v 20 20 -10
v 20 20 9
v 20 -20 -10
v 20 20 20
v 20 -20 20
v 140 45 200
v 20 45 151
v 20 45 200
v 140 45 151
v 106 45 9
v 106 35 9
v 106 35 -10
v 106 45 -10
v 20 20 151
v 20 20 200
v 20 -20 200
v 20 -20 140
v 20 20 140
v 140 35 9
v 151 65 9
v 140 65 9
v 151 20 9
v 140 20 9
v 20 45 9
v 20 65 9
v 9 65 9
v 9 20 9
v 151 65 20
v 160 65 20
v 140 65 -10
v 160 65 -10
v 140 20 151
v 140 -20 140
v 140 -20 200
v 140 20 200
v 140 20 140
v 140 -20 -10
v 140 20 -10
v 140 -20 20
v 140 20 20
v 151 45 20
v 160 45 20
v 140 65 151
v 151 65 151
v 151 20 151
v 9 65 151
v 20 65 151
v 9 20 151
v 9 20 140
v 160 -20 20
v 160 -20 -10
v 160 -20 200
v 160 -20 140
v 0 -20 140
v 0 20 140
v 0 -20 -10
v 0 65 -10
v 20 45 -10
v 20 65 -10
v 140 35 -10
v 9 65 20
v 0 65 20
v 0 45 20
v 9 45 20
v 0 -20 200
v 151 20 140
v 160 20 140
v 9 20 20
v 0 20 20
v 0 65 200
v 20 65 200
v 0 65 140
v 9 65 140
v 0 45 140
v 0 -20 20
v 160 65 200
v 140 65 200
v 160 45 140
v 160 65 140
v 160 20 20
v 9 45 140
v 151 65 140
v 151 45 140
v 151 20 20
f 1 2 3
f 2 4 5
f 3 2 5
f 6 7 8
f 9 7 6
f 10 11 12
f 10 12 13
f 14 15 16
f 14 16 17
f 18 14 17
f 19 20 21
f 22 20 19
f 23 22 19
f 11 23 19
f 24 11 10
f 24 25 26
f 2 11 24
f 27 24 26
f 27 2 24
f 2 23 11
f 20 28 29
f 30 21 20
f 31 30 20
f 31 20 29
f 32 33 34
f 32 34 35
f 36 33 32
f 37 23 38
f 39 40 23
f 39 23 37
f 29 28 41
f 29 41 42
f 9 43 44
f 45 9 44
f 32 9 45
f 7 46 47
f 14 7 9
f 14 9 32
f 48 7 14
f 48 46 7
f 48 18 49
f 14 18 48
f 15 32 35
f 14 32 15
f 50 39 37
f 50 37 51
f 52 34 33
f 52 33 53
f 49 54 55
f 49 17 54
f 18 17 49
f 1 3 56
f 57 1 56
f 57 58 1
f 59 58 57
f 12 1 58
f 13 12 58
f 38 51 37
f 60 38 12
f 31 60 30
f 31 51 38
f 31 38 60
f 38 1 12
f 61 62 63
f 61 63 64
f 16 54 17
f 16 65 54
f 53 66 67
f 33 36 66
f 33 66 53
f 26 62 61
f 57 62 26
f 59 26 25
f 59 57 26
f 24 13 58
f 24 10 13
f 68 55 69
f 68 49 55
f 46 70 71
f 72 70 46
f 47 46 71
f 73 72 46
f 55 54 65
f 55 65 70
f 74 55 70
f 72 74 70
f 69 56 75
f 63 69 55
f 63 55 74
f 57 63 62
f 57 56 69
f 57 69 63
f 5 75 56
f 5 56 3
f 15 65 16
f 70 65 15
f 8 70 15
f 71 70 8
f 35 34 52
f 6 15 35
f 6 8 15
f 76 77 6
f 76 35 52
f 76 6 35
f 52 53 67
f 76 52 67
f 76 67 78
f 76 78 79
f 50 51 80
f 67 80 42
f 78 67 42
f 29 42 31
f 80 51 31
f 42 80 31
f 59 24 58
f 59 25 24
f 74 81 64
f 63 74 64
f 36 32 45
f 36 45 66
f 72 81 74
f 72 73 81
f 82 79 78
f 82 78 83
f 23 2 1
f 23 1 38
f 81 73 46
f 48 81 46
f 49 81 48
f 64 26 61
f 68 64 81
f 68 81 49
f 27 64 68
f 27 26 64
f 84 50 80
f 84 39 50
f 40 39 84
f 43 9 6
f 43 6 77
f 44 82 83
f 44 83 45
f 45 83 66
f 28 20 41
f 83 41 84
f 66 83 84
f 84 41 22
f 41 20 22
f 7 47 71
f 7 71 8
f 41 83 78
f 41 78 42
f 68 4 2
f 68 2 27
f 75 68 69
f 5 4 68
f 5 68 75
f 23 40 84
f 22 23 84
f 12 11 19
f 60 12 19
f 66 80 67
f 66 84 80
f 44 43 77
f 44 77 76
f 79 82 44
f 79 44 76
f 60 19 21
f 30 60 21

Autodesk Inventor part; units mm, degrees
ref_plane "YZ Plane" through (0, 0, 0) normal (1, 0, 0) x (0, 1, 0)
ref_plane "XZ Plane" through (0, 0, 0) normal (0, 1, 0) x (-1, 0, 0)
ref_plane "XY Plane" through (0, 0, 0) normal (0, 0, 1) x (1, 0, 0)
sketch "Sketch1" plane through (0, 0, 0) normal (0, 1, 0) x (-1, 0, 0)
  line L0 (0, 0) -> (-160, 0)
  line L1 (-160, 0) -> (-160, 190)
  line L2 (-160, 190) -> (0, 190)
  line L3 (0, 190) -> (0, 0)
  dimension "d0" = 160
  dimension "d1" = 190
extrude "Extrusion1" add sketch "Sketch1" along normal blind 55
sketch "Sketch2" plane through (0, 55, 0) normal (0, 1, 0) x (1, 0, 0)
  line L0 (0, 0) -> (10, 0)
  line L1 (10, 0) -> (10, -10)
  line L2 (10, -10) -> (0, -10)
  line L3 (0, -10) -> (0, 0)
  line L4 (10, -10) -> (150, -10)
  line L5 (150, -10) -> (150, -150)
  line L6 (150, -150) -> (10, -150)
  line L7 (10, -150) -> (10, -10)
  dimension "d4" = 10
  dimension "d5" = 10
  dimension "d6" = 140
  dimension "d7" = 140
extrude "Extrusion2" cut sketch "Sketch2" against normal blind 35 contours L4 L5 L6 L7
sketch "Sketch3" plane through (0, 20, 0) normal (0, 1, 0) x (1, 0, 0)
  line L0 (10, -150) -> (10, -10) projected
  line L1 (10, -10) -> (20, -10)
  line L2 (20, -10) -> (20, -20)
  line L3 (20, -20) -> (10, -20)
  line L4 (10, -20) -> (10, -10)
  line L5 (20, -20) -> (140, -20)
  line L6 (140, -20) -> (140, -140)
  line L7 (140, -140) -> (20, -140)
  line L8 (20, -140) -> (20, -20)
  point P0 (0, 0)
  dimension "d10" = 10
  dimension "d11" = 10
  dimension "d12" = 120
  dimension "d13" = 120
extrude "Extrusion3" cut sketch "Sketch3" against normal blind 20 contours L5 L6 L7 L8
sketch "Sketch4" plane through (0, 20, 0) normal (0, 1, 0) x (1, 0, 0)
  line L0 (20, -20) -> (20, -140) projected
  line L1 (20, -20) -> (10, -20)
  line L2 (10, -20) -> (10, -140)
  line L3 (10, -140) -> (20, -140)
  line L4 (20, -140) -> (20, -20)
  line L5 (140, -20) -> (20, -20) projected
  line L6 (140, -20) -> (150, -20)
  line L7 (150, -20) -> (150, -140)
  line L8 (150, -140) -> (140, -140)
  line L9 (140, -140) -> (140, -20)
  line L10 (20, -20) -> (140, -20)
  line L11 (140, -20) -> (140, -10)
  line L12 (140, -10) -> (20, -10)
  line L13 (20, -10) -> (20, -20)
  line L14 (20, -140) -> (140, -140)
  line L15 (140, -140) -> (140, -150)
  line L16 (140, -150) -> (20, -150)
  line L17 (20, -150) -> (20, -140)
  point P0 (0, 0)
  dimension "d16" = 10
  dimension "d17" = 10
  dimension "d18" = 120
  dimension "d19" = 120
  dimension "d20" = 10
  dimension "d21" = 120
  dimension "d22" = 10
extrude "Extrusion4" cut sketch "Sketch4" against normal blind 20 contours L0 L3 L2 L1 | L13 L12 L11 L5 | L14 L15 L16 L17 | L6 L7 L8 L9
sketch "Sketch5" plane through (10, 55, 150) normal (1, 0, 0) x (0, 0, -1)
  line L0 (0, -35) -> (10, -35) projected
  line L1 (10, -35) -> (130, -35)
  line L2 (130, -35) -> (130, -55)
  line L3 (130, -55) -> (10, -55)
  line L4 (10, -55) -> (10, -35)
  point P0 (150, -55)
extrude "Extrusion5" cut sketch "Sketch5" against normal blind 10
sketch "Sketch6" plane through (150, 55, 10) normal (-1, 0, 0) x (0, 0, 1)
  line L0 (130, -35) -> (130, -55) projected
  line L1 (10, -35) -> (130, -35)
  line L2 (130, -35) -> (130, -55)
  line L3 (130, -55) -> (10, -55)
  line L4 (10, -55) -> (10, -35)
  point P0 (-10, -55)
  dimension "d27" = 120
  dimension "d28" = 20
extrude "Extrusion6" cut sketch "Sketch6" against normal blind 10
sketch "Sketch7" plane through (0, 0, 0) normal (0, -1, 0) x (1, 0, 0)
  line L0 (160, 190) -> (0, 190) projected
  line L1 (160, 190) -> (150, 190)
  line L2 (150, 190) -> (150, 180)
  line L3 (150, 180) -> (160, 180)
  line L4 (160, 180) -> (160, 190)
  line L5 (0, 140) -> (20, 140) projected
  line L6 (150, 150) -> (10, 150) projected
  line L7 (0, 140) -> (20, 140)
  line L8 (20, 140) -> (20, 150)
  line L9 (20, 150) -> (0, 150)
  line L10 (0, 150) -> (0, 140)
  line L11 (10, 150) -> (10, 10) projected
  line L12 (10, 150) -> (20, 150)
  line L13 (20, 150) -> (20, 160)
  line L14 (20, 160) -> (10, 160)
  line L15 (10, 160) -> (10, 150)
  line L16 (10, 160) -> (150, 160)
  line L17 (150, 160) -> (150, 180)
  line L18 (150, 180) -> (10, 180)
  line L19 (10, 180) -> (10, 160)
  point P0 (0, 0)
  dimension "d31" = 10
  dimension "d32" = 10
  dimension "d33" = 20
  dimension "d34" = 10
  dimension "d35" = 10
extrude "Extrusion7" cut sketch "Sketch7" against normal blind 45 contours L17 L16 L14 L19 L18
sketch "Sketch8" plane through (10, 55, 10) normal (0, 0, 1) x (1, 0, 0)
  line L0 (10, -35) -> (10, -55) projected
  line L1 (130, -55) -> (10, -55)
  line L2 (10, -55) -> (10, -35)
  line L3 (10, -35) -> (130, -35)
  line L4 (130, -35) -> (130, -55)
  point P0 (-10, -55)
  dimension "d38" = 120
  dimension "d39" = 20
extrude "Extrusion8" cut sketch "Sketch8" against normal blind 10
sketch "Sketch9" plane through (150, 55, 10) normal (-1, 0, 0) x (0, 0, 1)
  line L0 (140, 0) -> (140, -35) projected
  line L1 (0, 0) -> (0, -35) projected
  line L2 (140, -35) -> (0, -35)
  line L3 (0, -35) -> (0, 0)
  line L4 (0, 0) -> (140, 0)
  line L5 (140, 0) -> (140, -35)
  point P0 (-10, -55)
extrude "Extrusion9" cut sketch "Sketch9" against normal blind 1
sketch "Sketch10" plane through (10, 55, 150) normal (1, 0, 0) x (0, 0, -1)
  line L0 (0, 0) -> (0, -35) projected
  line L1 (0, 0) -> (140, 0)
  line L2 (140, 0) -> (140, -35)
  line L3 (140, -35) -> (0, -35)
  line L4 (0, -35) -> (0, 0)
  point P0 (150, -55)
extrude "Extrusion10" cut sketch "Sketch10" against normal blind 1
sketch "Sketch11" plane through (20, 20, 10) normal (0, 0, 1) x (1, 0, 0)
  line L0 (120, 0) -> (131, 0) projected
  line L1 (131, 0) -> (-11, 0)
  line L2 (-11, 0) -> (-11, 35)
  line L3 (-11, 35) -> (131, 35)
  line L4 (131, 35) -> (131, 0)
  point P0 (-20, -20)
extrude "Extrusion11" cut sketch "Sketch11" against normal blind 1
sketch "Sketch12" plane through (140, 0, 150) normal (0, 0, -1) x (-1, 0, 0)
  line L0 (-11, 55) -> (-11, 20) projected
  line L1 (-11, 55) -> (131, 55)
  line L2 (131, 55) -> (131, 20)
  line L3 (131, 20) -> (-11, 20)
  line L4 (-11, 20) -> (-11, 55)
  line L5 (0, 0) -> (-20, 0) projected
  line L6 (0, 0) -> (120, 0)
  line L7 (120, 0) -> (120, 20)
  line L8 (120, 20) -> (0, 20)
  line L9 (0, 20) -> (0, 0)
  point P0 (140, 0)
extrude "Extrusion12" cut sketch "Sketch12" against normal blind 1
sketch "Sketch14" plane through (160, 55, 0) normal (0, 0, -1) x (-1, 0, 0)
  line L0 (0, -55) -> (0, 0) projected
  line L1 (20, -35) -> (20, -55) projected
  line L2 (0, -55) -> (20, -55)
  line L3 (20, -55) -> (20, -35)
  line L4 (20, -35) -> (0, -35)
  line L5 (0, -35) -> (0, -55)
  line L6 (160, -55) -> (160, -35) projected
  line L7 (140, -35) -> (140, -55) projected
  line L8 (160, -55) -> (140, -55)
  line L9 (140, -55) -> (140, -35)
  line L10 (140, -35) -> (160, -35)
  line L11 (160, -35) -> (160, -55)
  line L12 (151, -35) -> (160, -35) projected
  line L13 (160, 0) -> (0, 0) projected
  line L14 (160, -35) -> (0, -35)
  line L15 (0, -35) -> (0, 0)
  line L16 (0, 0) -> (160, 0)
  line L17 (160, 0) -> (160, -35)
extrude "Extrusion13" add sketch "Sketch14" along normal blind 10
sketch "Sketch15" plane through (0, 0, 190) normal (0, 0, 1) x (1, 0, 0)
  line L0 (0, 0) -> (0, 55) projected
  line L1 (160, 0) -> (140, 0) projected
  line L2 (0, 55) -> (160, 55)
  line L3 (160, 55) -> (160, 0)
  line L4 (160, 0) -> (0, 0)
  line L5 (0, 0) -> (0, 55)
extrude "Extrusion14" add sketch "Sketch15" along normal blind 10
sketch "Sketch16" plane through (0, 45, 0) normal (0, -1, 0) x (1, 0, 0)
  line L0 (10, 160) -> (10, 180) projected
  line L1 (10, 180) -> (150, 180) projected
  line L2 (10, 160) -> (150, 160)
  line L3 (150, 160) -> (150, 180)
  line L4 (150, 180) -> (10, 180)
  line L5 (10, 180) -> (10, 160)
  point P0 (0, 0)
extrude "Extrusion15" add sketch "Sketch16" along normal blind 45
sketch "Sketch17" plane through (20, 20, 9) normal (0, 0, 1) x (1, 0, 0)
  line L0 (-11, 0) -> (-11, 35) projected
  line L1 (-11, 35) -> (131, 35)
  line L2 (131, 35) -> (131, 25)
  line L3 (131, 25) -> (-11, 25)
  line L4 (-11, 25) -> (-11, 35)
  point P0 (-20, -20)
  dimension "d56" = 142
  dimension "d57" = 10
extrude "Extrusion16" cut sketch "Sketch17" against normal blind 19
sketch "Sketch19" plane through (9, 55, 150) normal (1, 0, 0) x (0, 0, -1)
  line L0 (160, 0) -> (160, -10) projected
  line L1 (141, -10) -> (160, -10) projected
  line L2 (160, 0) -> (141, 0)
  line L3 (141, 0) -> (141, -10)
  line L4 (141, -10) -> (160, -10)
  line L5 (160, -10) -> (160, 0)
  point P0 (150, -55)
extrude "Extrusion17" add sketch "Sketch19" along normal blind 11
sketch "Sketch21" plane through (151, 55, 10) normal (-1, 0, 0) x (0, 0, 1)
  line L0 (-20, -10) -> (-20, 0) projected
  line L1 (-1, -10) -> (-1, -35) projected
  line L2 (-20, 0) -> (-1, 0)
  line L3 (-1, 0) -> (-1, -10)
  line L4 (-1, -10) -> (-20, -10)
  line L5 (-20, -10) -> (-20, 0)
  point P0 (-10, -55)
extrude "Extrusion18" add sketch "Sketch21" along normal blind 11
sketch "Sketch22" plane through (151, 55, 10) normal (-1, 0, 0) x (0, 0, 1)
  line L0 (-1, 0) -> (141, 0) projected
  line L1 (-1, 0) -> (141, 0)
  line L2 (141, 0) -> (141, -10)
  line L3 (141, -10) -> (-1, -10)
  line L4 (-1, -10) -> (-1, 0)
  point P0 (-10, -55)
  dimension "d64" = 142
  dimension "d65" = 10
extrude "Extrusion19" cut sketch "Sketch22" against normal blind 9
sketch "Sketch23" plane through (20, 20, 9) normal (0, 0, 1) x (1, 0, 0)
  line L0 (120, 35) -> (140, 35) projected
  line L1 (131, 25) -> (140, 25) projected
  line L2 (140, 35) -> (131, 35)
  line L3 (131, 35) -> (131, 25)
  line L4 (131, 25) -> (140, 25)
  line L5 (140, 25) -> (140, 35)
  point P0 (-20, -20)
extrude "Extrusion20" add sketch "Sketch23" along normal blind 11
sketch "Sketch24" plane through (9, 55, 150) normal (1, 0, 0) x (0, 0, -1)
  line L0 (-1, 0) -> (141, 0) projected
  line L1 (141, 0) -> (-1, 0)
  line L2 (-1, 0) -> (-1, -10)
  line L3 (-1, -10) -> (141, -10)
  line L4 (141, -10) -> (141, 0)
  point P0 (150, -55)
  dimension "d70" = 142
  dimension "d71" = 10
extrude "Extrusion21" cut sketch "Sketch24" against normal blind 9
sketch "Sketch25" plane through (20, 20, 9) normal (0, 0, 1) x (1, 0, 0)
  line L0 (-20, 25) -> (-20, 35) projected
  line L1 (-11, 0) -> (-11, 25) projected
  line L2 (-20, 35) -> (-11, 35)
  line L3 (-11, 35) -> (-11, 25)
  line L4 (-11, 25) -> (-20, 25)
  line L5 (-20, 25) -> (-20, 35)
  point P0 (-20, -20)
extrude "Extrusion22" add sketch "Sketch25" along normal blind 11
sketch "Sketch26" plane through (140, 0, 151) normal (0, 0, -1) x (-1, 0, 0)
  line L0 (-20, 45) -> (-20, 55) projected
  line L1 (-11, 45) -> (-20, 45) projected
  line L2 (-20, 55) -> (-11, 55)
  line L3 (-11, 55) -> (-11, 45)
  line L4 (-11, 45) -> (-20, 45)
  line L5 (-20, 45) -> (-20, 55)
  line L6 (-20, 55) -> (140, 55) projected
  line L7 (131, 45) -> (140, 45) projected
  line L8 (140, 55) -> (131, 55)
  line L9 (131, 55) -> (131, 45)
  line L10 (131, 45) -> (140, 45)
  line L11 (140, 45) -> (140, 55)
  point P0 (140, 0)
extrude "Extrusion23" add sketch "Sketch26" along normal blind 11
sketch "Sketch27" plane through (140, 0, 151) normal (0, 0, -1) x (-1, 0, 0)
  line L0 (0, 0) -> (0, 20) projected
  line L1 (120, 0) -> (0, 0) projected
  line L2 (0, 20) -> (120, 20)
  line L3 (120, 20) -> (120, 0)
  line L4 (120, 0) -> (0, 0)
  line L5 (0, 0) -> (0, 20)
  point P0 (140, 0)
extrude "Extrusion24" cut sketch "Sketch27" against normal blind 50
sketch "Sketch28" plane through (140, 0, 151) normal (0, 0, -1) x (-1, 0, 0)
  line L0 (-11, 20) -> (-11, 55) projected
  line L1 (-11, 55) -> (0, 55)
  line L2 (-11, 55) -> (131, 55) projected
  line L3 (131, 55) -> (120, 55)
  line L4 (0, 55) -> (120, 55)
  line L5 (120, 55) -> (120, 45)
  line L6 (120, 45) -> (0, 45)
  line L7 (0, 45) -> (0, 55)
  point P0 (140, 0)
  dimension "d80" = 11
  dimension "d81" = 11
  dimension "d82" = 120
  dimension "d83" = 10
extrude "Extrusion25" cut sketch "Sketch28" against normal blind 50
sketch "Sketch29" plane through (20, 20, 9) normal (0, 0, 1) x (1, 0, 0)
  line L0 (120, 25) -> (86, 25)
  line L1 (120, 25) -> (0, 25) projected
  line L2 (86, 25) -> (106, 25)
  line L3 (106, 25) -> (106, 15)
  line L4 (106, 15) -> (86, 15)
  line L5 (86, 15) -> (86, 25)
  point P0 (-20, -20)
  dimension "d86" = 34
  dimension "d87" = 20
  dimension "d88" = 10
extrude "Extrusion26" cut sketch "Sketch29" against normal blind 19
sketch "Sketch30" plane through (20, 20, 9) normal (0, 0, 1) x (1, 0, 0)
  line L0 (120, 25) -> (106, 25) projected
  line L1 (106, 15) -> (86, 15) projected
  line L2 (120, 25) -> (106, 25)
  line L3 (106, 25) -> (106, 15)
  line L4 (106, 15) -> (120, 15)
  line L5 (120, 15) -> (120, 25)
  point P0 (-20, -20)
extrude "Extrusion27" cut sketch "Sketch30" against normal blind 19
sketch "Sketch31" plane through (0, 0, 0) normal (0, -1, 0) x (1, 0, 0)
  line L0 (0, 20) -> (0, -10) projected
  line L1 (20, 20) -> (20, 9) projected
  line L2 (0, -10) -> (20, -10)
  line L3 (20, -10) -> (20, 20)
  line L4 (20, 20) -> (0, 20)
  line L5 (0, 20) -> (0, -10)
  line L6 (106, -10) -> (140, -10) projected
  line L7 (160, -10) -> (160, 20) projected
  line L8 (140, -10) -> (160, -10)
  line L9 (160, -10) -> (160, 20)
  line L10 (160, 20) -> (140, 20)
  line L11 (140, 20) -> (140, -10)
  line L12 (151, 140) -> (140, 140) projected
  line L13 (160, 140) -> (160, 200) projected
  line L14 (140, 140) -> (160, 140)
  line L15 (160, 140) -> (160, 200)
  line L16 (160, 200) -> (140, 200)
  line L17 (140, 200) -> (140, 140)
  line L18 (0, 200) -> (0, 140) projected
  line L19 (20, 200) -> (0, 200) projected
  line L20 (0, 140) -> (20, 140)
  line L21 (20, 140) -> (20, 200)
  line L22 (20, 200) -> (0, 200)
  line L23 (0, 200) -> (0, 140)
  point P0 (0, 0)
extrude "Extrusion28" add sketch "Sketch31" along normal blind 20
sketch "Sketch32" plane through (0, 55, 0) normal (0, 1, 0) x (1, 0, 0)
  line L0 (0, -20) -> (0, 10) projected
  line L1 (20, -9) -> (20, 10) projected
  line L2 (0, 10) -> (20, 10)
  line L3 (20, 10) -> (20, -9)
  line L4 (20, -9) -> (0, -9)
  line L5 (0, -9) -> (0, 10)
  line L6 (9, -9) -> (9, -20) projected
  line L7 (9, -20) -> (0, -20)
  line L8 (0, -20) -> (0, -9)
  line L9 (0, -9) -> (9, -9)
  line L10 (9, -9) -> (9, -20)
  line L11 (151, -20) -> (151, -9) projected
  line L12 (160, 10) -> (160, -20) projected
  line L13 (151, -20) -> (160, -20)
  line L14 (160, -20) -> (160, 10)
  line L15 (160, 10) -> (151, 10)
  line L16 (151, 10) -> (151, -20)
  line L17 (151, 10) -> (140, 10)
  line L18 (140, 10) -> (140, -9)
  line L19 (140, -9) -> (151, -9)
  line L20 (151, -9) -> (151, 10)
  line L21 (160, -200) -> (140, -200) projected
  line L22 (140, -140) -> (140, -151) projected
  line L23 (160, -200) -> (140, -200)
  line L24 (140, -200) -> (140, -151)
  line L25 (140, -151) -> (160, -151)
  line L26 (160, -151) -> (160, -200)
  line L27 (151, -151) -> (151, -140) projected
  line L28 (160, -140) -> (160, -200) projected
  line L29 (151, -151) -> (160, -151)
  line L30 (160, -151) -> (160, -140)
  line L31 (160, -140) -> (151, -140)
  line L32 (151, -140) -> (151, -151)
  line L33 (0, -140) -> (20, -140) projected
  line L34 (9, -151) -> (20, -151) projected
  line L35 (0, -140) -> (9, -140)
  line L36 (9, -140) -> (9, -151)
  line L37 (9, -151) -> (0, -151)
  line L38 (0, -151) -> (0, -140)
  line L39 (20, -151) -> (20, -200) projected
  line L40 (20, -200) -> (0, -200)
  line L41 (0, -200) -> (0, -151)
  line L42 (0, -151) -> (20, -151)
  line L43 (20, -151) -> (20, -200)
  point P0 (0, 0)
extrude "Extrusion29" add sketch "Sketch32" along normal blind 10
properties part number "140mmLaptopStand"
